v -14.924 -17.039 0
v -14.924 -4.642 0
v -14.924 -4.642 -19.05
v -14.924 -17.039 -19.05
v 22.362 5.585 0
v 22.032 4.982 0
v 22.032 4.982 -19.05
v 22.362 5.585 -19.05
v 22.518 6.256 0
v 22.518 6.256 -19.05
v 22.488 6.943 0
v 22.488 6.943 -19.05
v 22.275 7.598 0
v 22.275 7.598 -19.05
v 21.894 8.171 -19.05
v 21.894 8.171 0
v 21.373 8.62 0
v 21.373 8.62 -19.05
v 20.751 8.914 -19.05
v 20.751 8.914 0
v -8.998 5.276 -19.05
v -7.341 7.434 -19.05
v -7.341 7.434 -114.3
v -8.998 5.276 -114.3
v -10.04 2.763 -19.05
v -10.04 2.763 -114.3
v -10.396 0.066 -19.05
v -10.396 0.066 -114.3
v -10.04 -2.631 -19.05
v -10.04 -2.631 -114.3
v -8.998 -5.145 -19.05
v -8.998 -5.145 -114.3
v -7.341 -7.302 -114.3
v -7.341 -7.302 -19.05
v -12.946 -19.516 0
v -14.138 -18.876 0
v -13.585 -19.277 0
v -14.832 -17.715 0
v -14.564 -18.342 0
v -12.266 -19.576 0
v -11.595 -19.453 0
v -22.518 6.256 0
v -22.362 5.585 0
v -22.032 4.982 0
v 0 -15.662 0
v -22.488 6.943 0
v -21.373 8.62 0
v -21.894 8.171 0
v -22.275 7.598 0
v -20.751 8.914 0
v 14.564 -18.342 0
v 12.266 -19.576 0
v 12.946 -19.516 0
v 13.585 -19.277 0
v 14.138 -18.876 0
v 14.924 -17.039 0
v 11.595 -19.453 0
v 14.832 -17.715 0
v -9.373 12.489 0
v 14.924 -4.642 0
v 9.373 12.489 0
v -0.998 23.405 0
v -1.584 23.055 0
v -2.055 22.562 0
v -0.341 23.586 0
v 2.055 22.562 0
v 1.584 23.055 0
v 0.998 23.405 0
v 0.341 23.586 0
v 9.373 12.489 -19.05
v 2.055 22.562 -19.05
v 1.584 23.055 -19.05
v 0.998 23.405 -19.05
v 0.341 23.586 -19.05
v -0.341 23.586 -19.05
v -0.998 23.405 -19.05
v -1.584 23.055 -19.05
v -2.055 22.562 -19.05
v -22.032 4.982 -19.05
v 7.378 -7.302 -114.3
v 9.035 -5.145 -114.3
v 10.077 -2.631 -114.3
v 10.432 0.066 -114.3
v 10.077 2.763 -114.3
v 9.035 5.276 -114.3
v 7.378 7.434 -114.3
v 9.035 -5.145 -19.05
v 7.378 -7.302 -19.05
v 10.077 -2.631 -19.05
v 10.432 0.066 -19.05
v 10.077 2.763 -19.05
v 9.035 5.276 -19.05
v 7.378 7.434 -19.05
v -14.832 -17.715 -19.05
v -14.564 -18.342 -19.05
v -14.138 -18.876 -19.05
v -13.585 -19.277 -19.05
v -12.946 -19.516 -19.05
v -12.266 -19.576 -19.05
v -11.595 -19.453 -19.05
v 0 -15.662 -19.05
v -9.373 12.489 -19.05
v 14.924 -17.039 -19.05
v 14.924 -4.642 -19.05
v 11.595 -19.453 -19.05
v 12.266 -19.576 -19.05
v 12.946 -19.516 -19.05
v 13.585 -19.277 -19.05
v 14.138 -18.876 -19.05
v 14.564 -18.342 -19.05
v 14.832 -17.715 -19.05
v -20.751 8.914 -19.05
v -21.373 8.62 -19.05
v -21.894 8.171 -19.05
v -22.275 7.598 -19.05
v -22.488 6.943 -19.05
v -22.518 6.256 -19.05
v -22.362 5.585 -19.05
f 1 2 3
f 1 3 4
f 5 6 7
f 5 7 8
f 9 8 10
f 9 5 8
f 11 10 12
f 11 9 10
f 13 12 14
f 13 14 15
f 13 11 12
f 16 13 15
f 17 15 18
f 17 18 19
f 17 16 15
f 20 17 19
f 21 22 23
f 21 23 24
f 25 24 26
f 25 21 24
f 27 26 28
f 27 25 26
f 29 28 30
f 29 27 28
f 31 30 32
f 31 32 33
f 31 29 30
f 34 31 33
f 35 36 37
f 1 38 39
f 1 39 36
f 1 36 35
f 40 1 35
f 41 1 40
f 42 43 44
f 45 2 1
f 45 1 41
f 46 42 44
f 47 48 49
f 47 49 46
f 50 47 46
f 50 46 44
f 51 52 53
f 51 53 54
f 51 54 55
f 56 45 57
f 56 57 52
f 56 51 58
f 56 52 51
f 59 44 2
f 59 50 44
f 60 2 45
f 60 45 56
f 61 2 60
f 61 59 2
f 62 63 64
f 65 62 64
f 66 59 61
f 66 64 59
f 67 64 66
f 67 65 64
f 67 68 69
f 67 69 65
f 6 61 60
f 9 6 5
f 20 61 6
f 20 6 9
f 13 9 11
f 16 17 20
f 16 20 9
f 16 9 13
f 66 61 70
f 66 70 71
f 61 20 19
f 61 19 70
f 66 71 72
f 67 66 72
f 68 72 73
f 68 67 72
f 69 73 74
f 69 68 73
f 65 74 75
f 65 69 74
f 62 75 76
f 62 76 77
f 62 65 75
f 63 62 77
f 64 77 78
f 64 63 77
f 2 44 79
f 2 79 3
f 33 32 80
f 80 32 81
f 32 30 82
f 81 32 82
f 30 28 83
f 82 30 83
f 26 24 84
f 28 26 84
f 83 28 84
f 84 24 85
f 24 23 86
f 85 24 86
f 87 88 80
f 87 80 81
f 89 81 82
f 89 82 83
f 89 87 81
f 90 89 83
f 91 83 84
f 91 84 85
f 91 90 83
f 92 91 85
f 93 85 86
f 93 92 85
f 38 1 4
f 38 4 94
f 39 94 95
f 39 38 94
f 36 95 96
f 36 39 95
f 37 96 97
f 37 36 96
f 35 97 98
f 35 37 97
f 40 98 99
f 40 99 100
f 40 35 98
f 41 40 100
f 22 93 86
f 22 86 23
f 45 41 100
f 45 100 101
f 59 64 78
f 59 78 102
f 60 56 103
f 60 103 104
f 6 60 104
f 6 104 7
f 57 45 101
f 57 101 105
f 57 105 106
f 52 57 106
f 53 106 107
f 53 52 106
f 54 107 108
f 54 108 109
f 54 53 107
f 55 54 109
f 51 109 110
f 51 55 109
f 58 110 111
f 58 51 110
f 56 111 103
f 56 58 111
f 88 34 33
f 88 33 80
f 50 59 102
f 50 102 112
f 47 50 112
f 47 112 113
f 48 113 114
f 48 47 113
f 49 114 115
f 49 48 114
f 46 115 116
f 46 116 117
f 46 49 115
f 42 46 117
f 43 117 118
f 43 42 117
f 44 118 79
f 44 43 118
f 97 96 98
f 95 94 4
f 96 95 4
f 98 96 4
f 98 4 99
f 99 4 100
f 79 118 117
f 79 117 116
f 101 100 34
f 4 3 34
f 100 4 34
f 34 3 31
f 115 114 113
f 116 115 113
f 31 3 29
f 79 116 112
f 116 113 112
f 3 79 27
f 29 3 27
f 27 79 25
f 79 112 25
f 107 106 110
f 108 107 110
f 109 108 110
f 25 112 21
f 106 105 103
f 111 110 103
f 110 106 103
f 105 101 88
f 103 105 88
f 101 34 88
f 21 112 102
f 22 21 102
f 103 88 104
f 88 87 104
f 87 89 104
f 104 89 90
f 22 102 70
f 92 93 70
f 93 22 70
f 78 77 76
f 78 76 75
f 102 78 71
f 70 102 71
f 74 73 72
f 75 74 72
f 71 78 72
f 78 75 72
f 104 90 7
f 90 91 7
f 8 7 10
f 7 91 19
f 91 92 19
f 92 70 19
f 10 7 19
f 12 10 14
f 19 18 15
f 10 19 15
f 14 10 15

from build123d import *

# Parameters (mm, degrees)
BOSS_EXTRUDE1_DEPTH = 114.3
BOSS_EXTRUDE2_DEPTH = 19.05


with BuildPart() as part:
    # Sketch1 → Boss-Extrude1 (new body)
    with BuildSketch(Plane.XY):
        with BuildLine():
            Line((-7.341079337, -7.302244278), (7.377825429, -7.302244278))
            ThreePointArc((7.377825429, -7.302244278), (10.432373046, 0.065920801), (7.377825429, 7.434085879))
            Line((7.377825429, 7.434085879), (-7.341079337, 7.434085879))
            ThreePointArc((-7.341079337, 7.434085879), (-10.395626954, 0.065920801), (-7.341079337, -7.302244278))
        make_face()
    extrude(amount=-BOSS_EXTRUDE1_DEPTH)

    # Sketch2 → Boss-Extrude2 (add)
    with BuildSketch(Plane.XY):
        with BuildLine():
            Line((-11.594830289, -19.452818555), (0, -15.661809823))
            Line((0, -15.661809823), (11.594830289, -19.452818555))
            ThreePointArc((11.594830289, -19.452818555), (13.875262434, -19.094861422), (14.924180561, -17.038584484))
            Line((14.924180561, -17.038584484), (14.924180561, -4.642008184))
            Line((14.924180561, -4.642008184), (22.032123103, 4.98159964))
            ThreePointArc((22.032123103, 4.98159964), (22.40396274, 7.277739061), (20.750529859, 8.913795499))
            Line((20.750529859, 8.913795499), (9.373214352, 12.489409744))
            Line((9.373214352, 12.489409744), (2.054903166, 22.56220095))
            ThreePointArc((2.054903166, 22.56220095), (0, 23.609226409), (-2.054903166, 22.56220095))
            Line((-2.054903166, 22.56220095), (-9.373214352, 12.489409744))
            Line((-9.373214352, 12.489409744), (-20.750529859, 8.913795499))
            ThreePointArc((-20.750529859, 8.913795499), (-22.40396274, 7.277739061), (-22.032123103, 4.98159964))
            Line((-22.032123103, 4.98159964), (-14.924180561, -4.642008184))
            Line((-14.924180561, -4.642008184), (-14.924180561, -17.038584484))
            ThreePointArc((-14.924180561, -17.038584484), (-13.875262434, -19.094861422), (-11.594830289, -19.452818555))
        make_face()
    extrude(amount=-BOSS_EXTRUDE2_DEPTH)


solid = part.part
